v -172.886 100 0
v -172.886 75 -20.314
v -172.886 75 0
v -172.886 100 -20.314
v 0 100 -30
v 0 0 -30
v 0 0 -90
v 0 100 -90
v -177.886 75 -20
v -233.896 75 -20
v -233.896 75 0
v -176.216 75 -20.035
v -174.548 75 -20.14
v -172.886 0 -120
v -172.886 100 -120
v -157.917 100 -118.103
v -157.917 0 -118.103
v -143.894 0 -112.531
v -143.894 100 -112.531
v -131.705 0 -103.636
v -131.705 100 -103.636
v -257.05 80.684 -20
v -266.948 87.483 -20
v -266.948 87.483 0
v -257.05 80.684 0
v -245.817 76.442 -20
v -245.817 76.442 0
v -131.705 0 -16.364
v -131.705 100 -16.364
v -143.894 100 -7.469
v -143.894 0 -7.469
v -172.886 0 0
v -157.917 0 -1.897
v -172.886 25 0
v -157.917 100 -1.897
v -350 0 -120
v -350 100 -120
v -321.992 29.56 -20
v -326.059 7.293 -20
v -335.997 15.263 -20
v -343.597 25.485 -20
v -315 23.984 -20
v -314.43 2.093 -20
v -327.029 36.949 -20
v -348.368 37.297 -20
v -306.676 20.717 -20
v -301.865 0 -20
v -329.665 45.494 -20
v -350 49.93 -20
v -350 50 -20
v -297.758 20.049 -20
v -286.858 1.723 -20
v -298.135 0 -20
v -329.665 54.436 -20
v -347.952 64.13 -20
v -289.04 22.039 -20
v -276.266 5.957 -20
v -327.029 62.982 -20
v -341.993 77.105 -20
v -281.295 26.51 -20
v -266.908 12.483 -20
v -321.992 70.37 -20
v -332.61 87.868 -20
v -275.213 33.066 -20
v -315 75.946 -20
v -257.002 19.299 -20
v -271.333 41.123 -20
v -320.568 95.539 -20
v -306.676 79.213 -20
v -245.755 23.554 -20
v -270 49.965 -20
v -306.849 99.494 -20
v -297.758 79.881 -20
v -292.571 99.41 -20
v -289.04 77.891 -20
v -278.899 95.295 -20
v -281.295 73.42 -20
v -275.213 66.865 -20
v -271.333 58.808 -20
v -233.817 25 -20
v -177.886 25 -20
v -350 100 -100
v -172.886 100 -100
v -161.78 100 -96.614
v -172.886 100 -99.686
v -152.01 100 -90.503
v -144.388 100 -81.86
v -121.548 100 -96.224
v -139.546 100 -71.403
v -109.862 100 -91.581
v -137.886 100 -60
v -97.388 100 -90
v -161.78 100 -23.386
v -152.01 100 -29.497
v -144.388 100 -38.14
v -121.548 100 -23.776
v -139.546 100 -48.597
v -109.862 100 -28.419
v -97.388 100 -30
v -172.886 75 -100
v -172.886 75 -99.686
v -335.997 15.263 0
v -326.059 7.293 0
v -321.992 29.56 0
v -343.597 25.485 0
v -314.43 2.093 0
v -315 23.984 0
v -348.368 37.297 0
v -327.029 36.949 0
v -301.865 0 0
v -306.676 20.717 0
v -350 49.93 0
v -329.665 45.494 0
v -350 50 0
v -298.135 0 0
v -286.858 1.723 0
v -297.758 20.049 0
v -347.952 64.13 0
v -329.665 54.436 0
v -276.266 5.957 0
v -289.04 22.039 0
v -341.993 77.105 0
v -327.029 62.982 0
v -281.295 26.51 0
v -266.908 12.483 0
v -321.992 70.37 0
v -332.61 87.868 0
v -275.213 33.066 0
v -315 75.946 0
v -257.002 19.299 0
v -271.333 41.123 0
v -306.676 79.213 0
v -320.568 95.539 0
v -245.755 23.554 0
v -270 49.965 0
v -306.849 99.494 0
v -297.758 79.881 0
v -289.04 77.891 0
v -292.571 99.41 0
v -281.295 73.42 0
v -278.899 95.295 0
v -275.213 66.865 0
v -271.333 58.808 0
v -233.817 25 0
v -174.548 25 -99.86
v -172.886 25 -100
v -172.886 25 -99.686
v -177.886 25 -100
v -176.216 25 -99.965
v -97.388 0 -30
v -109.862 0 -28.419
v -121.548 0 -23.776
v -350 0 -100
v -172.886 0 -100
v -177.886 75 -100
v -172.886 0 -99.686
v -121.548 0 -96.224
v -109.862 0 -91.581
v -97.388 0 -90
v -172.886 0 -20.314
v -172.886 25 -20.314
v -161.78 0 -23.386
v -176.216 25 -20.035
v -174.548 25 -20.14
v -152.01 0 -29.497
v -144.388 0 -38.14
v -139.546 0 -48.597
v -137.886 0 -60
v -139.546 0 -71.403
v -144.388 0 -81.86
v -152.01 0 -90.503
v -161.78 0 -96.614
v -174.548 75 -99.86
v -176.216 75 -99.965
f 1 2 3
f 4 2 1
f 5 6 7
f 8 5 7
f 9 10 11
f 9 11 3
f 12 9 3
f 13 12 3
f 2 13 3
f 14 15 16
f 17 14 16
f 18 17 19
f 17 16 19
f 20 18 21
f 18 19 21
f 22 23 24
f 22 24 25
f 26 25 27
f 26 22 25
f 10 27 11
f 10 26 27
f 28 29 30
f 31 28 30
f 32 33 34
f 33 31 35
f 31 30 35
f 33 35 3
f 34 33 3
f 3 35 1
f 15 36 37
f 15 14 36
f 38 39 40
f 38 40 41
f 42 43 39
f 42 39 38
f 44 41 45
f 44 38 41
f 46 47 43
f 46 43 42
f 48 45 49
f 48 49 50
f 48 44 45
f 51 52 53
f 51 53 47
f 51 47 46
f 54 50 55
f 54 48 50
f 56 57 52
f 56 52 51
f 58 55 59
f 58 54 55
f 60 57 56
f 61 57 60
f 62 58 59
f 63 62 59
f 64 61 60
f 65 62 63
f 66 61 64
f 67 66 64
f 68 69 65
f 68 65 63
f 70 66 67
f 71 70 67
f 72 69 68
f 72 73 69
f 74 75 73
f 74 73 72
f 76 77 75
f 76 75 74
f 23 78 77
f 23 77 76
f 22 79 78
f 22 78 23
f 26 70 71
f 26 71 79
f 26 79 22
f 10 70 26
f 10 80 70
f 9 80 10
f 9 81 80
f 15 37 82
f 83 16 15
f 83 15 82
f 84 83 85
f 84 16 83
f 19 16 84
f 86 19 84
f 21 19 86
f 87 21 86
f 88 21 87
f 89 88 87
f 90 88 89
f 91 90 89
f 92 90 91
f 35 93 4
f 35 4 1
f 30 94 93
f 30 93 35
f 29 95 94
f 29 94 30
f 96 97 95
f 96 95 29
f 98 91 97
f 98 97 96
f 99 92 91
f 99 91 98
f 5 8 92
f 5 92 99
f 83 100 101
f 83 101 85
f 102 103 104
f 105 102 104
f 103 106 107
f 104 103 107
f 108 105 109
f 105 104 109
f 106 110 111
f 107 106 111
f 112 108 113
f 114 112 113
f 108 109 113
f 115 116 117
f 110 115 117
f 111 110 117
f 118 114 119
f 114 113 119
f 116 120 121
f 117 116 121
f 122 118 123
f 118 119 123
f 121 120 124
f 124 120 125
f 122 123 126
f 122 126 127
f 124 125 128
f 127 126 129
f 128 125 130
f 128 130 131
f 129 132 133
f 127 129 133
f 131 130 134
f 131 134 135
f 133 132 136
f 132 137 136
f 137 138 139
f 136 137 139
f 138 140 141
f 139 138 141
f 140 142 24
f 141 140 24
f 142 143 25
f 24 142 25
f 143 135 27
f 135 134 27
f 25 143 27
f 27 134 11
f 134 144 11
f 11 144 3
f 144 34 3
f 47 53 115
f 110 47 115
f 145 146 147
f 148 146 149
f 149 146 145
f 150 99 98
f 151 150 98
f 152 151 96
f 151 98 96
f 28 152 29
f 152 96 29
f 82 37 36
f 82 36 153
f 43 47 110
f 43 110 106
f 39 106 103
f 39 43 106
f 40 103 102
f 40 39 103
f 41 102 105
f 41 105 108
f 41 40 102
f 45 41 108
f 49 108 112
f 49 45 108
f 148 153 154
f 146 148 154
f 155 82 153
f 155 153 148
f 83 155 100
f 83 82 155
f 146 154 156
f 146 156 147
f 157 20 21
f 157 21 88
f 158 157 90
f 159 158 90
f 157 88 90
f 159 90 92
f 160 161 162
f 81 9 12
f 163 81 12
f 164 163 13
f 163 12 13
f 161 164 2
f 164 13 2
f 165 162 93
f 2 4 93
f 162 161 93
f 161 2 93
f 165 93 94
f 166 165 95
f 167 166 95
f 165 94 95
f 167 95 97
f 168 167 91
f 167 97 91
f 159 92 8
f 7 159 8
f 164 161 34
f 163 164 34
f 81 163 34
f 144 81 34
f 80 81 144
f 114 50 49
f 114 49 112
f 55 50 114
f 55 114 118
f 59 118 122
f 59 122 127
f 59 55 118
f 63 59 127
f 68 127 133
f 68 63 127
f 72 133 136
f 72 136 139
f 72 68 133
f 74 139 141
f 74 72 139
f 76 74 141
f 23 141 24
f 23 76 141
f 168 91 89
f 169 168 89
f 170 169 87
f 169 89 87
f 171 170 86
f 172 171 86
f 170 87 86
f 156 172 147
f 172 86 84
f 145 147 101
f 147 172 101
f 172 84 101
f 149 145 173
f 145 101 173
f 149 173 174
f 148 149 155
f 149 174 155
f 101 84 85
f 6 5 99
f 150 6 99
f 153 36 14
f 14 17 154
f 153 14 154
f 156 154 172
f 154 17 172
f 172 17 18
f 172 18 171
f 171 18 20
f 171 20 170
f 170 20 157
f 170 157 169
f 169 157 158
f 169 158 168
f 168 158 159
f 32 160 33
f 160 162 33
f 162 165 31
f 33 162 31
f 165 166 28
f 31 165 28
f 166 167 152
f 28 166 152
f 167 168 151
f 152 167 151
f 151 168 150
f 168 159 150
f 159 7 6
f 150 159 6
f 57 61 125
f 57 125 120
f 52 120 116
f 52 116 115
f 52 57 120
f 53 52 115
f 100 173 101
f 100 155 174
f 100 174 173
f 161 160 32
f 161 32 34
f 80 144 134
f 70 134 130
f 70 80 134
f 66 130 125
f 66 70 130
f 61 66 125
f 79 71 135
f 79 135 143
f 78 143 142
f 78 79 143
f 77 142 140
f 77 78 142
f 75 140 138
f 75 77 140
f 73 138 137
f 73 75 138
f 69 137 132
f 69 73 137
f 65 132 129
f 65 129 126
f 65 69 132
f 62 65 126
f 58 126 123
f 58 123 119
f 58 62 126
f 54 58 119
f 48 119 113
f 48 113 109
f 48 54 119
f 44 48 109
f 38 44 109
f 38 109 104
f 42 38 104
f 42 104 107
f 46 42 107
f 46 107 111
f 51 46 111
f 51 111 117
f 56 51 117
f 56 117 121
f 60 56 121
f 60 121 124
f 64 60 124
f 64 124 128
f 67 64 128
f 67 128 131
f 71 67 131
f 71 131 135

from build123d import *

# Parameters (mm, degrees)
SKETCH1_W              = 250
SKETCH1_H              = 120
BOSS_EXTRUDE1_DEPTH    = 100
CUT_EXTRUDE1_DEPTH     = 100
SKETCH5_W              = 20
SKETCH5_H              = 100
BOSS_EXTRUDE2_DEPTH    = 100
SKETCH6_W              = 20
SKETCH6_H              = 100
BOSS_EXTRUDE3_DEPTH    = 100
CUT_EXTRUDE2_START     = -100
CUT_EXTRUDE2_OUTLINE_R = 30
CUT_EXTRUDE2_DEPTH     = 100


# Read off the part's stored shape, not the designer's step: Cut-Extrude2
with BuildPart() as part:
    # Sketch1 → Boss-Extrude1 (new body)
    with BuildSketch(Plane(origin=(0, 0, 0), x_dir=(1, 0, 0), z_dir=(0, 1, 0))):
        with Locations((-125, 60)):
            Rectangle(SKETCH1_W, SKETCH1_H)
    extrude(amount=BOSS_EXTRUDE1_DEPTH)

    # Sketch2 → Cut-Extrude1 (cut)
    with BuildSketch(Plane(origin=(0, 100, 0), x_dir=(1, 0, 0), z_dir=(0, 1, 0))):
        with BuildLine():
            Line((-137.886107131, 60), (-250, 60))
            Line((-250, 60), (-250, 20))
            Line((-250, 20), (-217.607466681, 20))
            Line((-217.607466681, 20), (-177.886107131, 20))
            ThreePointArc((-177.886107131, 20), (-149.601835883, 31.715728753), (-137.886107131, 60))
        make_face()
        with BuildLine():
            Line((-250, 100), (-250, 60))
            Line((-250, 60), (-137.886107131, 60))
            ThreePointArc((-137.886107131, 60), (-149.601835883, 88.284271247), (-177.886107131, 100))
            Line((-177.886107131, 100), (-217.607466681, 100))
            Line((-217.607466681, 100), (-250, 100))
        make_face()
        with BuildLine():
            Line((0, 0), (0, 30))
            Line((0, 30), (-97.387762778, 30))
            ThreePointArc((-97.387762778, 30), (-115.851486425, 26.466018864), (-131.705192029, 16.363636364))
            ThreePointArc((-131.705192029, 16.363636364), (-150.729638754, 4.240777363), (-172.886107131, 0))
            Line((-172.886107131, 0), (0, 0))
        make_face()
        with BuildLine():
            Line((-97.387762778, 90), (0, 90))
            Line((0, 90), (0, 120))
            Line((0, 120), (-172.886107131, 120))
            ThreePointArc((-172.886107131, 120), (-150.729638754, 115.759222637), (-131.705192029, 103.636363636))
            ThreePointArc((-131.705192029, 103.636363636), (-115.851486425, 93.533981136), (-97.387762778, 90))
        make_face()
    extrude(amount=-CUT_EXTRUDE1_DEPTH, mode=Mode.SUBTRACT)

    # Sketch5 → Boss-Extrude2 (add)
    with BuildSketch(Plane.ZY.offset(250)):
        with Locations((-110, 50)):
            Rectangle(SKETCH5_W, SKETCH5_H)
    extrude(amount=BOSS_EXTRUDE2_DEPTH)

    # Sketch6 → Boss-Extrude3 (add)
    with BuildSketch(Plane.ZY.offset(250)):
        with Locations((-10, 50)):
            Rectangle(SKETCH6_W, SKETCH6_H)
    extrude(amount=BOSS_EXTRUDE3_DEPTH)

    # Cut-Extrude2 outline → Cut-Extrude2 (cut)
    with BuildSketch(Plane.XY.offset(CUT_EXTRUDE2_START)):
        with BuildLine():
            ThreePointArc((-266.908391633, 12.482609105), (-281.440890736, 3.537211244), (-298.135255344, 0))
            Line((-298.135255344, 0), (-172.886107131, 0))
            Line((-172.886107131, 0), (-172.886107131, 25))
            Line((-172.886107131, 25), (-233.816791268, 25))
            ThreePointArc((-233.816791268, 25), (-251.506753743, 21.766069191), (-266.908391633, 12.482609105))
        make_face()
        with BuildLine():
            Line((-350, 100), (-350, 50))
            ThreePointArc((-350, 50), (-320.568029043, 95.538875256), (-266.947820205, 87.482618173))
            ThreePointArc((-266.947820205, 87.482618173), (-251.561022849, 78.224637407), (-233.895648402, 75))
            Line((-233.895648402, 75), (-172.886107131, 75))
            Line((-172.886107131, 75), (-172.886107131, 100))
            Line((-172.886107131, 100), (-350, 100))
        make_face()
        with BuildLine():
            ThreePointArc((-301.864744656, 0), (-335.996534658, 15.262911764), (-350, 49.930454547))
            Line((-350, 49.930454547), (-350, 0))
            Line((-350, 0), (-301.864744656, 0))
        make_face()
        with Locations((-300, 49.965227274)):
            Circle(CUT_EXTRUDE2_OUTLINE_R)
    extrude(amount=CUT_EXTRUDE2_DEPTH, mode=Mode.SUBTRACT)


solid = part.part
